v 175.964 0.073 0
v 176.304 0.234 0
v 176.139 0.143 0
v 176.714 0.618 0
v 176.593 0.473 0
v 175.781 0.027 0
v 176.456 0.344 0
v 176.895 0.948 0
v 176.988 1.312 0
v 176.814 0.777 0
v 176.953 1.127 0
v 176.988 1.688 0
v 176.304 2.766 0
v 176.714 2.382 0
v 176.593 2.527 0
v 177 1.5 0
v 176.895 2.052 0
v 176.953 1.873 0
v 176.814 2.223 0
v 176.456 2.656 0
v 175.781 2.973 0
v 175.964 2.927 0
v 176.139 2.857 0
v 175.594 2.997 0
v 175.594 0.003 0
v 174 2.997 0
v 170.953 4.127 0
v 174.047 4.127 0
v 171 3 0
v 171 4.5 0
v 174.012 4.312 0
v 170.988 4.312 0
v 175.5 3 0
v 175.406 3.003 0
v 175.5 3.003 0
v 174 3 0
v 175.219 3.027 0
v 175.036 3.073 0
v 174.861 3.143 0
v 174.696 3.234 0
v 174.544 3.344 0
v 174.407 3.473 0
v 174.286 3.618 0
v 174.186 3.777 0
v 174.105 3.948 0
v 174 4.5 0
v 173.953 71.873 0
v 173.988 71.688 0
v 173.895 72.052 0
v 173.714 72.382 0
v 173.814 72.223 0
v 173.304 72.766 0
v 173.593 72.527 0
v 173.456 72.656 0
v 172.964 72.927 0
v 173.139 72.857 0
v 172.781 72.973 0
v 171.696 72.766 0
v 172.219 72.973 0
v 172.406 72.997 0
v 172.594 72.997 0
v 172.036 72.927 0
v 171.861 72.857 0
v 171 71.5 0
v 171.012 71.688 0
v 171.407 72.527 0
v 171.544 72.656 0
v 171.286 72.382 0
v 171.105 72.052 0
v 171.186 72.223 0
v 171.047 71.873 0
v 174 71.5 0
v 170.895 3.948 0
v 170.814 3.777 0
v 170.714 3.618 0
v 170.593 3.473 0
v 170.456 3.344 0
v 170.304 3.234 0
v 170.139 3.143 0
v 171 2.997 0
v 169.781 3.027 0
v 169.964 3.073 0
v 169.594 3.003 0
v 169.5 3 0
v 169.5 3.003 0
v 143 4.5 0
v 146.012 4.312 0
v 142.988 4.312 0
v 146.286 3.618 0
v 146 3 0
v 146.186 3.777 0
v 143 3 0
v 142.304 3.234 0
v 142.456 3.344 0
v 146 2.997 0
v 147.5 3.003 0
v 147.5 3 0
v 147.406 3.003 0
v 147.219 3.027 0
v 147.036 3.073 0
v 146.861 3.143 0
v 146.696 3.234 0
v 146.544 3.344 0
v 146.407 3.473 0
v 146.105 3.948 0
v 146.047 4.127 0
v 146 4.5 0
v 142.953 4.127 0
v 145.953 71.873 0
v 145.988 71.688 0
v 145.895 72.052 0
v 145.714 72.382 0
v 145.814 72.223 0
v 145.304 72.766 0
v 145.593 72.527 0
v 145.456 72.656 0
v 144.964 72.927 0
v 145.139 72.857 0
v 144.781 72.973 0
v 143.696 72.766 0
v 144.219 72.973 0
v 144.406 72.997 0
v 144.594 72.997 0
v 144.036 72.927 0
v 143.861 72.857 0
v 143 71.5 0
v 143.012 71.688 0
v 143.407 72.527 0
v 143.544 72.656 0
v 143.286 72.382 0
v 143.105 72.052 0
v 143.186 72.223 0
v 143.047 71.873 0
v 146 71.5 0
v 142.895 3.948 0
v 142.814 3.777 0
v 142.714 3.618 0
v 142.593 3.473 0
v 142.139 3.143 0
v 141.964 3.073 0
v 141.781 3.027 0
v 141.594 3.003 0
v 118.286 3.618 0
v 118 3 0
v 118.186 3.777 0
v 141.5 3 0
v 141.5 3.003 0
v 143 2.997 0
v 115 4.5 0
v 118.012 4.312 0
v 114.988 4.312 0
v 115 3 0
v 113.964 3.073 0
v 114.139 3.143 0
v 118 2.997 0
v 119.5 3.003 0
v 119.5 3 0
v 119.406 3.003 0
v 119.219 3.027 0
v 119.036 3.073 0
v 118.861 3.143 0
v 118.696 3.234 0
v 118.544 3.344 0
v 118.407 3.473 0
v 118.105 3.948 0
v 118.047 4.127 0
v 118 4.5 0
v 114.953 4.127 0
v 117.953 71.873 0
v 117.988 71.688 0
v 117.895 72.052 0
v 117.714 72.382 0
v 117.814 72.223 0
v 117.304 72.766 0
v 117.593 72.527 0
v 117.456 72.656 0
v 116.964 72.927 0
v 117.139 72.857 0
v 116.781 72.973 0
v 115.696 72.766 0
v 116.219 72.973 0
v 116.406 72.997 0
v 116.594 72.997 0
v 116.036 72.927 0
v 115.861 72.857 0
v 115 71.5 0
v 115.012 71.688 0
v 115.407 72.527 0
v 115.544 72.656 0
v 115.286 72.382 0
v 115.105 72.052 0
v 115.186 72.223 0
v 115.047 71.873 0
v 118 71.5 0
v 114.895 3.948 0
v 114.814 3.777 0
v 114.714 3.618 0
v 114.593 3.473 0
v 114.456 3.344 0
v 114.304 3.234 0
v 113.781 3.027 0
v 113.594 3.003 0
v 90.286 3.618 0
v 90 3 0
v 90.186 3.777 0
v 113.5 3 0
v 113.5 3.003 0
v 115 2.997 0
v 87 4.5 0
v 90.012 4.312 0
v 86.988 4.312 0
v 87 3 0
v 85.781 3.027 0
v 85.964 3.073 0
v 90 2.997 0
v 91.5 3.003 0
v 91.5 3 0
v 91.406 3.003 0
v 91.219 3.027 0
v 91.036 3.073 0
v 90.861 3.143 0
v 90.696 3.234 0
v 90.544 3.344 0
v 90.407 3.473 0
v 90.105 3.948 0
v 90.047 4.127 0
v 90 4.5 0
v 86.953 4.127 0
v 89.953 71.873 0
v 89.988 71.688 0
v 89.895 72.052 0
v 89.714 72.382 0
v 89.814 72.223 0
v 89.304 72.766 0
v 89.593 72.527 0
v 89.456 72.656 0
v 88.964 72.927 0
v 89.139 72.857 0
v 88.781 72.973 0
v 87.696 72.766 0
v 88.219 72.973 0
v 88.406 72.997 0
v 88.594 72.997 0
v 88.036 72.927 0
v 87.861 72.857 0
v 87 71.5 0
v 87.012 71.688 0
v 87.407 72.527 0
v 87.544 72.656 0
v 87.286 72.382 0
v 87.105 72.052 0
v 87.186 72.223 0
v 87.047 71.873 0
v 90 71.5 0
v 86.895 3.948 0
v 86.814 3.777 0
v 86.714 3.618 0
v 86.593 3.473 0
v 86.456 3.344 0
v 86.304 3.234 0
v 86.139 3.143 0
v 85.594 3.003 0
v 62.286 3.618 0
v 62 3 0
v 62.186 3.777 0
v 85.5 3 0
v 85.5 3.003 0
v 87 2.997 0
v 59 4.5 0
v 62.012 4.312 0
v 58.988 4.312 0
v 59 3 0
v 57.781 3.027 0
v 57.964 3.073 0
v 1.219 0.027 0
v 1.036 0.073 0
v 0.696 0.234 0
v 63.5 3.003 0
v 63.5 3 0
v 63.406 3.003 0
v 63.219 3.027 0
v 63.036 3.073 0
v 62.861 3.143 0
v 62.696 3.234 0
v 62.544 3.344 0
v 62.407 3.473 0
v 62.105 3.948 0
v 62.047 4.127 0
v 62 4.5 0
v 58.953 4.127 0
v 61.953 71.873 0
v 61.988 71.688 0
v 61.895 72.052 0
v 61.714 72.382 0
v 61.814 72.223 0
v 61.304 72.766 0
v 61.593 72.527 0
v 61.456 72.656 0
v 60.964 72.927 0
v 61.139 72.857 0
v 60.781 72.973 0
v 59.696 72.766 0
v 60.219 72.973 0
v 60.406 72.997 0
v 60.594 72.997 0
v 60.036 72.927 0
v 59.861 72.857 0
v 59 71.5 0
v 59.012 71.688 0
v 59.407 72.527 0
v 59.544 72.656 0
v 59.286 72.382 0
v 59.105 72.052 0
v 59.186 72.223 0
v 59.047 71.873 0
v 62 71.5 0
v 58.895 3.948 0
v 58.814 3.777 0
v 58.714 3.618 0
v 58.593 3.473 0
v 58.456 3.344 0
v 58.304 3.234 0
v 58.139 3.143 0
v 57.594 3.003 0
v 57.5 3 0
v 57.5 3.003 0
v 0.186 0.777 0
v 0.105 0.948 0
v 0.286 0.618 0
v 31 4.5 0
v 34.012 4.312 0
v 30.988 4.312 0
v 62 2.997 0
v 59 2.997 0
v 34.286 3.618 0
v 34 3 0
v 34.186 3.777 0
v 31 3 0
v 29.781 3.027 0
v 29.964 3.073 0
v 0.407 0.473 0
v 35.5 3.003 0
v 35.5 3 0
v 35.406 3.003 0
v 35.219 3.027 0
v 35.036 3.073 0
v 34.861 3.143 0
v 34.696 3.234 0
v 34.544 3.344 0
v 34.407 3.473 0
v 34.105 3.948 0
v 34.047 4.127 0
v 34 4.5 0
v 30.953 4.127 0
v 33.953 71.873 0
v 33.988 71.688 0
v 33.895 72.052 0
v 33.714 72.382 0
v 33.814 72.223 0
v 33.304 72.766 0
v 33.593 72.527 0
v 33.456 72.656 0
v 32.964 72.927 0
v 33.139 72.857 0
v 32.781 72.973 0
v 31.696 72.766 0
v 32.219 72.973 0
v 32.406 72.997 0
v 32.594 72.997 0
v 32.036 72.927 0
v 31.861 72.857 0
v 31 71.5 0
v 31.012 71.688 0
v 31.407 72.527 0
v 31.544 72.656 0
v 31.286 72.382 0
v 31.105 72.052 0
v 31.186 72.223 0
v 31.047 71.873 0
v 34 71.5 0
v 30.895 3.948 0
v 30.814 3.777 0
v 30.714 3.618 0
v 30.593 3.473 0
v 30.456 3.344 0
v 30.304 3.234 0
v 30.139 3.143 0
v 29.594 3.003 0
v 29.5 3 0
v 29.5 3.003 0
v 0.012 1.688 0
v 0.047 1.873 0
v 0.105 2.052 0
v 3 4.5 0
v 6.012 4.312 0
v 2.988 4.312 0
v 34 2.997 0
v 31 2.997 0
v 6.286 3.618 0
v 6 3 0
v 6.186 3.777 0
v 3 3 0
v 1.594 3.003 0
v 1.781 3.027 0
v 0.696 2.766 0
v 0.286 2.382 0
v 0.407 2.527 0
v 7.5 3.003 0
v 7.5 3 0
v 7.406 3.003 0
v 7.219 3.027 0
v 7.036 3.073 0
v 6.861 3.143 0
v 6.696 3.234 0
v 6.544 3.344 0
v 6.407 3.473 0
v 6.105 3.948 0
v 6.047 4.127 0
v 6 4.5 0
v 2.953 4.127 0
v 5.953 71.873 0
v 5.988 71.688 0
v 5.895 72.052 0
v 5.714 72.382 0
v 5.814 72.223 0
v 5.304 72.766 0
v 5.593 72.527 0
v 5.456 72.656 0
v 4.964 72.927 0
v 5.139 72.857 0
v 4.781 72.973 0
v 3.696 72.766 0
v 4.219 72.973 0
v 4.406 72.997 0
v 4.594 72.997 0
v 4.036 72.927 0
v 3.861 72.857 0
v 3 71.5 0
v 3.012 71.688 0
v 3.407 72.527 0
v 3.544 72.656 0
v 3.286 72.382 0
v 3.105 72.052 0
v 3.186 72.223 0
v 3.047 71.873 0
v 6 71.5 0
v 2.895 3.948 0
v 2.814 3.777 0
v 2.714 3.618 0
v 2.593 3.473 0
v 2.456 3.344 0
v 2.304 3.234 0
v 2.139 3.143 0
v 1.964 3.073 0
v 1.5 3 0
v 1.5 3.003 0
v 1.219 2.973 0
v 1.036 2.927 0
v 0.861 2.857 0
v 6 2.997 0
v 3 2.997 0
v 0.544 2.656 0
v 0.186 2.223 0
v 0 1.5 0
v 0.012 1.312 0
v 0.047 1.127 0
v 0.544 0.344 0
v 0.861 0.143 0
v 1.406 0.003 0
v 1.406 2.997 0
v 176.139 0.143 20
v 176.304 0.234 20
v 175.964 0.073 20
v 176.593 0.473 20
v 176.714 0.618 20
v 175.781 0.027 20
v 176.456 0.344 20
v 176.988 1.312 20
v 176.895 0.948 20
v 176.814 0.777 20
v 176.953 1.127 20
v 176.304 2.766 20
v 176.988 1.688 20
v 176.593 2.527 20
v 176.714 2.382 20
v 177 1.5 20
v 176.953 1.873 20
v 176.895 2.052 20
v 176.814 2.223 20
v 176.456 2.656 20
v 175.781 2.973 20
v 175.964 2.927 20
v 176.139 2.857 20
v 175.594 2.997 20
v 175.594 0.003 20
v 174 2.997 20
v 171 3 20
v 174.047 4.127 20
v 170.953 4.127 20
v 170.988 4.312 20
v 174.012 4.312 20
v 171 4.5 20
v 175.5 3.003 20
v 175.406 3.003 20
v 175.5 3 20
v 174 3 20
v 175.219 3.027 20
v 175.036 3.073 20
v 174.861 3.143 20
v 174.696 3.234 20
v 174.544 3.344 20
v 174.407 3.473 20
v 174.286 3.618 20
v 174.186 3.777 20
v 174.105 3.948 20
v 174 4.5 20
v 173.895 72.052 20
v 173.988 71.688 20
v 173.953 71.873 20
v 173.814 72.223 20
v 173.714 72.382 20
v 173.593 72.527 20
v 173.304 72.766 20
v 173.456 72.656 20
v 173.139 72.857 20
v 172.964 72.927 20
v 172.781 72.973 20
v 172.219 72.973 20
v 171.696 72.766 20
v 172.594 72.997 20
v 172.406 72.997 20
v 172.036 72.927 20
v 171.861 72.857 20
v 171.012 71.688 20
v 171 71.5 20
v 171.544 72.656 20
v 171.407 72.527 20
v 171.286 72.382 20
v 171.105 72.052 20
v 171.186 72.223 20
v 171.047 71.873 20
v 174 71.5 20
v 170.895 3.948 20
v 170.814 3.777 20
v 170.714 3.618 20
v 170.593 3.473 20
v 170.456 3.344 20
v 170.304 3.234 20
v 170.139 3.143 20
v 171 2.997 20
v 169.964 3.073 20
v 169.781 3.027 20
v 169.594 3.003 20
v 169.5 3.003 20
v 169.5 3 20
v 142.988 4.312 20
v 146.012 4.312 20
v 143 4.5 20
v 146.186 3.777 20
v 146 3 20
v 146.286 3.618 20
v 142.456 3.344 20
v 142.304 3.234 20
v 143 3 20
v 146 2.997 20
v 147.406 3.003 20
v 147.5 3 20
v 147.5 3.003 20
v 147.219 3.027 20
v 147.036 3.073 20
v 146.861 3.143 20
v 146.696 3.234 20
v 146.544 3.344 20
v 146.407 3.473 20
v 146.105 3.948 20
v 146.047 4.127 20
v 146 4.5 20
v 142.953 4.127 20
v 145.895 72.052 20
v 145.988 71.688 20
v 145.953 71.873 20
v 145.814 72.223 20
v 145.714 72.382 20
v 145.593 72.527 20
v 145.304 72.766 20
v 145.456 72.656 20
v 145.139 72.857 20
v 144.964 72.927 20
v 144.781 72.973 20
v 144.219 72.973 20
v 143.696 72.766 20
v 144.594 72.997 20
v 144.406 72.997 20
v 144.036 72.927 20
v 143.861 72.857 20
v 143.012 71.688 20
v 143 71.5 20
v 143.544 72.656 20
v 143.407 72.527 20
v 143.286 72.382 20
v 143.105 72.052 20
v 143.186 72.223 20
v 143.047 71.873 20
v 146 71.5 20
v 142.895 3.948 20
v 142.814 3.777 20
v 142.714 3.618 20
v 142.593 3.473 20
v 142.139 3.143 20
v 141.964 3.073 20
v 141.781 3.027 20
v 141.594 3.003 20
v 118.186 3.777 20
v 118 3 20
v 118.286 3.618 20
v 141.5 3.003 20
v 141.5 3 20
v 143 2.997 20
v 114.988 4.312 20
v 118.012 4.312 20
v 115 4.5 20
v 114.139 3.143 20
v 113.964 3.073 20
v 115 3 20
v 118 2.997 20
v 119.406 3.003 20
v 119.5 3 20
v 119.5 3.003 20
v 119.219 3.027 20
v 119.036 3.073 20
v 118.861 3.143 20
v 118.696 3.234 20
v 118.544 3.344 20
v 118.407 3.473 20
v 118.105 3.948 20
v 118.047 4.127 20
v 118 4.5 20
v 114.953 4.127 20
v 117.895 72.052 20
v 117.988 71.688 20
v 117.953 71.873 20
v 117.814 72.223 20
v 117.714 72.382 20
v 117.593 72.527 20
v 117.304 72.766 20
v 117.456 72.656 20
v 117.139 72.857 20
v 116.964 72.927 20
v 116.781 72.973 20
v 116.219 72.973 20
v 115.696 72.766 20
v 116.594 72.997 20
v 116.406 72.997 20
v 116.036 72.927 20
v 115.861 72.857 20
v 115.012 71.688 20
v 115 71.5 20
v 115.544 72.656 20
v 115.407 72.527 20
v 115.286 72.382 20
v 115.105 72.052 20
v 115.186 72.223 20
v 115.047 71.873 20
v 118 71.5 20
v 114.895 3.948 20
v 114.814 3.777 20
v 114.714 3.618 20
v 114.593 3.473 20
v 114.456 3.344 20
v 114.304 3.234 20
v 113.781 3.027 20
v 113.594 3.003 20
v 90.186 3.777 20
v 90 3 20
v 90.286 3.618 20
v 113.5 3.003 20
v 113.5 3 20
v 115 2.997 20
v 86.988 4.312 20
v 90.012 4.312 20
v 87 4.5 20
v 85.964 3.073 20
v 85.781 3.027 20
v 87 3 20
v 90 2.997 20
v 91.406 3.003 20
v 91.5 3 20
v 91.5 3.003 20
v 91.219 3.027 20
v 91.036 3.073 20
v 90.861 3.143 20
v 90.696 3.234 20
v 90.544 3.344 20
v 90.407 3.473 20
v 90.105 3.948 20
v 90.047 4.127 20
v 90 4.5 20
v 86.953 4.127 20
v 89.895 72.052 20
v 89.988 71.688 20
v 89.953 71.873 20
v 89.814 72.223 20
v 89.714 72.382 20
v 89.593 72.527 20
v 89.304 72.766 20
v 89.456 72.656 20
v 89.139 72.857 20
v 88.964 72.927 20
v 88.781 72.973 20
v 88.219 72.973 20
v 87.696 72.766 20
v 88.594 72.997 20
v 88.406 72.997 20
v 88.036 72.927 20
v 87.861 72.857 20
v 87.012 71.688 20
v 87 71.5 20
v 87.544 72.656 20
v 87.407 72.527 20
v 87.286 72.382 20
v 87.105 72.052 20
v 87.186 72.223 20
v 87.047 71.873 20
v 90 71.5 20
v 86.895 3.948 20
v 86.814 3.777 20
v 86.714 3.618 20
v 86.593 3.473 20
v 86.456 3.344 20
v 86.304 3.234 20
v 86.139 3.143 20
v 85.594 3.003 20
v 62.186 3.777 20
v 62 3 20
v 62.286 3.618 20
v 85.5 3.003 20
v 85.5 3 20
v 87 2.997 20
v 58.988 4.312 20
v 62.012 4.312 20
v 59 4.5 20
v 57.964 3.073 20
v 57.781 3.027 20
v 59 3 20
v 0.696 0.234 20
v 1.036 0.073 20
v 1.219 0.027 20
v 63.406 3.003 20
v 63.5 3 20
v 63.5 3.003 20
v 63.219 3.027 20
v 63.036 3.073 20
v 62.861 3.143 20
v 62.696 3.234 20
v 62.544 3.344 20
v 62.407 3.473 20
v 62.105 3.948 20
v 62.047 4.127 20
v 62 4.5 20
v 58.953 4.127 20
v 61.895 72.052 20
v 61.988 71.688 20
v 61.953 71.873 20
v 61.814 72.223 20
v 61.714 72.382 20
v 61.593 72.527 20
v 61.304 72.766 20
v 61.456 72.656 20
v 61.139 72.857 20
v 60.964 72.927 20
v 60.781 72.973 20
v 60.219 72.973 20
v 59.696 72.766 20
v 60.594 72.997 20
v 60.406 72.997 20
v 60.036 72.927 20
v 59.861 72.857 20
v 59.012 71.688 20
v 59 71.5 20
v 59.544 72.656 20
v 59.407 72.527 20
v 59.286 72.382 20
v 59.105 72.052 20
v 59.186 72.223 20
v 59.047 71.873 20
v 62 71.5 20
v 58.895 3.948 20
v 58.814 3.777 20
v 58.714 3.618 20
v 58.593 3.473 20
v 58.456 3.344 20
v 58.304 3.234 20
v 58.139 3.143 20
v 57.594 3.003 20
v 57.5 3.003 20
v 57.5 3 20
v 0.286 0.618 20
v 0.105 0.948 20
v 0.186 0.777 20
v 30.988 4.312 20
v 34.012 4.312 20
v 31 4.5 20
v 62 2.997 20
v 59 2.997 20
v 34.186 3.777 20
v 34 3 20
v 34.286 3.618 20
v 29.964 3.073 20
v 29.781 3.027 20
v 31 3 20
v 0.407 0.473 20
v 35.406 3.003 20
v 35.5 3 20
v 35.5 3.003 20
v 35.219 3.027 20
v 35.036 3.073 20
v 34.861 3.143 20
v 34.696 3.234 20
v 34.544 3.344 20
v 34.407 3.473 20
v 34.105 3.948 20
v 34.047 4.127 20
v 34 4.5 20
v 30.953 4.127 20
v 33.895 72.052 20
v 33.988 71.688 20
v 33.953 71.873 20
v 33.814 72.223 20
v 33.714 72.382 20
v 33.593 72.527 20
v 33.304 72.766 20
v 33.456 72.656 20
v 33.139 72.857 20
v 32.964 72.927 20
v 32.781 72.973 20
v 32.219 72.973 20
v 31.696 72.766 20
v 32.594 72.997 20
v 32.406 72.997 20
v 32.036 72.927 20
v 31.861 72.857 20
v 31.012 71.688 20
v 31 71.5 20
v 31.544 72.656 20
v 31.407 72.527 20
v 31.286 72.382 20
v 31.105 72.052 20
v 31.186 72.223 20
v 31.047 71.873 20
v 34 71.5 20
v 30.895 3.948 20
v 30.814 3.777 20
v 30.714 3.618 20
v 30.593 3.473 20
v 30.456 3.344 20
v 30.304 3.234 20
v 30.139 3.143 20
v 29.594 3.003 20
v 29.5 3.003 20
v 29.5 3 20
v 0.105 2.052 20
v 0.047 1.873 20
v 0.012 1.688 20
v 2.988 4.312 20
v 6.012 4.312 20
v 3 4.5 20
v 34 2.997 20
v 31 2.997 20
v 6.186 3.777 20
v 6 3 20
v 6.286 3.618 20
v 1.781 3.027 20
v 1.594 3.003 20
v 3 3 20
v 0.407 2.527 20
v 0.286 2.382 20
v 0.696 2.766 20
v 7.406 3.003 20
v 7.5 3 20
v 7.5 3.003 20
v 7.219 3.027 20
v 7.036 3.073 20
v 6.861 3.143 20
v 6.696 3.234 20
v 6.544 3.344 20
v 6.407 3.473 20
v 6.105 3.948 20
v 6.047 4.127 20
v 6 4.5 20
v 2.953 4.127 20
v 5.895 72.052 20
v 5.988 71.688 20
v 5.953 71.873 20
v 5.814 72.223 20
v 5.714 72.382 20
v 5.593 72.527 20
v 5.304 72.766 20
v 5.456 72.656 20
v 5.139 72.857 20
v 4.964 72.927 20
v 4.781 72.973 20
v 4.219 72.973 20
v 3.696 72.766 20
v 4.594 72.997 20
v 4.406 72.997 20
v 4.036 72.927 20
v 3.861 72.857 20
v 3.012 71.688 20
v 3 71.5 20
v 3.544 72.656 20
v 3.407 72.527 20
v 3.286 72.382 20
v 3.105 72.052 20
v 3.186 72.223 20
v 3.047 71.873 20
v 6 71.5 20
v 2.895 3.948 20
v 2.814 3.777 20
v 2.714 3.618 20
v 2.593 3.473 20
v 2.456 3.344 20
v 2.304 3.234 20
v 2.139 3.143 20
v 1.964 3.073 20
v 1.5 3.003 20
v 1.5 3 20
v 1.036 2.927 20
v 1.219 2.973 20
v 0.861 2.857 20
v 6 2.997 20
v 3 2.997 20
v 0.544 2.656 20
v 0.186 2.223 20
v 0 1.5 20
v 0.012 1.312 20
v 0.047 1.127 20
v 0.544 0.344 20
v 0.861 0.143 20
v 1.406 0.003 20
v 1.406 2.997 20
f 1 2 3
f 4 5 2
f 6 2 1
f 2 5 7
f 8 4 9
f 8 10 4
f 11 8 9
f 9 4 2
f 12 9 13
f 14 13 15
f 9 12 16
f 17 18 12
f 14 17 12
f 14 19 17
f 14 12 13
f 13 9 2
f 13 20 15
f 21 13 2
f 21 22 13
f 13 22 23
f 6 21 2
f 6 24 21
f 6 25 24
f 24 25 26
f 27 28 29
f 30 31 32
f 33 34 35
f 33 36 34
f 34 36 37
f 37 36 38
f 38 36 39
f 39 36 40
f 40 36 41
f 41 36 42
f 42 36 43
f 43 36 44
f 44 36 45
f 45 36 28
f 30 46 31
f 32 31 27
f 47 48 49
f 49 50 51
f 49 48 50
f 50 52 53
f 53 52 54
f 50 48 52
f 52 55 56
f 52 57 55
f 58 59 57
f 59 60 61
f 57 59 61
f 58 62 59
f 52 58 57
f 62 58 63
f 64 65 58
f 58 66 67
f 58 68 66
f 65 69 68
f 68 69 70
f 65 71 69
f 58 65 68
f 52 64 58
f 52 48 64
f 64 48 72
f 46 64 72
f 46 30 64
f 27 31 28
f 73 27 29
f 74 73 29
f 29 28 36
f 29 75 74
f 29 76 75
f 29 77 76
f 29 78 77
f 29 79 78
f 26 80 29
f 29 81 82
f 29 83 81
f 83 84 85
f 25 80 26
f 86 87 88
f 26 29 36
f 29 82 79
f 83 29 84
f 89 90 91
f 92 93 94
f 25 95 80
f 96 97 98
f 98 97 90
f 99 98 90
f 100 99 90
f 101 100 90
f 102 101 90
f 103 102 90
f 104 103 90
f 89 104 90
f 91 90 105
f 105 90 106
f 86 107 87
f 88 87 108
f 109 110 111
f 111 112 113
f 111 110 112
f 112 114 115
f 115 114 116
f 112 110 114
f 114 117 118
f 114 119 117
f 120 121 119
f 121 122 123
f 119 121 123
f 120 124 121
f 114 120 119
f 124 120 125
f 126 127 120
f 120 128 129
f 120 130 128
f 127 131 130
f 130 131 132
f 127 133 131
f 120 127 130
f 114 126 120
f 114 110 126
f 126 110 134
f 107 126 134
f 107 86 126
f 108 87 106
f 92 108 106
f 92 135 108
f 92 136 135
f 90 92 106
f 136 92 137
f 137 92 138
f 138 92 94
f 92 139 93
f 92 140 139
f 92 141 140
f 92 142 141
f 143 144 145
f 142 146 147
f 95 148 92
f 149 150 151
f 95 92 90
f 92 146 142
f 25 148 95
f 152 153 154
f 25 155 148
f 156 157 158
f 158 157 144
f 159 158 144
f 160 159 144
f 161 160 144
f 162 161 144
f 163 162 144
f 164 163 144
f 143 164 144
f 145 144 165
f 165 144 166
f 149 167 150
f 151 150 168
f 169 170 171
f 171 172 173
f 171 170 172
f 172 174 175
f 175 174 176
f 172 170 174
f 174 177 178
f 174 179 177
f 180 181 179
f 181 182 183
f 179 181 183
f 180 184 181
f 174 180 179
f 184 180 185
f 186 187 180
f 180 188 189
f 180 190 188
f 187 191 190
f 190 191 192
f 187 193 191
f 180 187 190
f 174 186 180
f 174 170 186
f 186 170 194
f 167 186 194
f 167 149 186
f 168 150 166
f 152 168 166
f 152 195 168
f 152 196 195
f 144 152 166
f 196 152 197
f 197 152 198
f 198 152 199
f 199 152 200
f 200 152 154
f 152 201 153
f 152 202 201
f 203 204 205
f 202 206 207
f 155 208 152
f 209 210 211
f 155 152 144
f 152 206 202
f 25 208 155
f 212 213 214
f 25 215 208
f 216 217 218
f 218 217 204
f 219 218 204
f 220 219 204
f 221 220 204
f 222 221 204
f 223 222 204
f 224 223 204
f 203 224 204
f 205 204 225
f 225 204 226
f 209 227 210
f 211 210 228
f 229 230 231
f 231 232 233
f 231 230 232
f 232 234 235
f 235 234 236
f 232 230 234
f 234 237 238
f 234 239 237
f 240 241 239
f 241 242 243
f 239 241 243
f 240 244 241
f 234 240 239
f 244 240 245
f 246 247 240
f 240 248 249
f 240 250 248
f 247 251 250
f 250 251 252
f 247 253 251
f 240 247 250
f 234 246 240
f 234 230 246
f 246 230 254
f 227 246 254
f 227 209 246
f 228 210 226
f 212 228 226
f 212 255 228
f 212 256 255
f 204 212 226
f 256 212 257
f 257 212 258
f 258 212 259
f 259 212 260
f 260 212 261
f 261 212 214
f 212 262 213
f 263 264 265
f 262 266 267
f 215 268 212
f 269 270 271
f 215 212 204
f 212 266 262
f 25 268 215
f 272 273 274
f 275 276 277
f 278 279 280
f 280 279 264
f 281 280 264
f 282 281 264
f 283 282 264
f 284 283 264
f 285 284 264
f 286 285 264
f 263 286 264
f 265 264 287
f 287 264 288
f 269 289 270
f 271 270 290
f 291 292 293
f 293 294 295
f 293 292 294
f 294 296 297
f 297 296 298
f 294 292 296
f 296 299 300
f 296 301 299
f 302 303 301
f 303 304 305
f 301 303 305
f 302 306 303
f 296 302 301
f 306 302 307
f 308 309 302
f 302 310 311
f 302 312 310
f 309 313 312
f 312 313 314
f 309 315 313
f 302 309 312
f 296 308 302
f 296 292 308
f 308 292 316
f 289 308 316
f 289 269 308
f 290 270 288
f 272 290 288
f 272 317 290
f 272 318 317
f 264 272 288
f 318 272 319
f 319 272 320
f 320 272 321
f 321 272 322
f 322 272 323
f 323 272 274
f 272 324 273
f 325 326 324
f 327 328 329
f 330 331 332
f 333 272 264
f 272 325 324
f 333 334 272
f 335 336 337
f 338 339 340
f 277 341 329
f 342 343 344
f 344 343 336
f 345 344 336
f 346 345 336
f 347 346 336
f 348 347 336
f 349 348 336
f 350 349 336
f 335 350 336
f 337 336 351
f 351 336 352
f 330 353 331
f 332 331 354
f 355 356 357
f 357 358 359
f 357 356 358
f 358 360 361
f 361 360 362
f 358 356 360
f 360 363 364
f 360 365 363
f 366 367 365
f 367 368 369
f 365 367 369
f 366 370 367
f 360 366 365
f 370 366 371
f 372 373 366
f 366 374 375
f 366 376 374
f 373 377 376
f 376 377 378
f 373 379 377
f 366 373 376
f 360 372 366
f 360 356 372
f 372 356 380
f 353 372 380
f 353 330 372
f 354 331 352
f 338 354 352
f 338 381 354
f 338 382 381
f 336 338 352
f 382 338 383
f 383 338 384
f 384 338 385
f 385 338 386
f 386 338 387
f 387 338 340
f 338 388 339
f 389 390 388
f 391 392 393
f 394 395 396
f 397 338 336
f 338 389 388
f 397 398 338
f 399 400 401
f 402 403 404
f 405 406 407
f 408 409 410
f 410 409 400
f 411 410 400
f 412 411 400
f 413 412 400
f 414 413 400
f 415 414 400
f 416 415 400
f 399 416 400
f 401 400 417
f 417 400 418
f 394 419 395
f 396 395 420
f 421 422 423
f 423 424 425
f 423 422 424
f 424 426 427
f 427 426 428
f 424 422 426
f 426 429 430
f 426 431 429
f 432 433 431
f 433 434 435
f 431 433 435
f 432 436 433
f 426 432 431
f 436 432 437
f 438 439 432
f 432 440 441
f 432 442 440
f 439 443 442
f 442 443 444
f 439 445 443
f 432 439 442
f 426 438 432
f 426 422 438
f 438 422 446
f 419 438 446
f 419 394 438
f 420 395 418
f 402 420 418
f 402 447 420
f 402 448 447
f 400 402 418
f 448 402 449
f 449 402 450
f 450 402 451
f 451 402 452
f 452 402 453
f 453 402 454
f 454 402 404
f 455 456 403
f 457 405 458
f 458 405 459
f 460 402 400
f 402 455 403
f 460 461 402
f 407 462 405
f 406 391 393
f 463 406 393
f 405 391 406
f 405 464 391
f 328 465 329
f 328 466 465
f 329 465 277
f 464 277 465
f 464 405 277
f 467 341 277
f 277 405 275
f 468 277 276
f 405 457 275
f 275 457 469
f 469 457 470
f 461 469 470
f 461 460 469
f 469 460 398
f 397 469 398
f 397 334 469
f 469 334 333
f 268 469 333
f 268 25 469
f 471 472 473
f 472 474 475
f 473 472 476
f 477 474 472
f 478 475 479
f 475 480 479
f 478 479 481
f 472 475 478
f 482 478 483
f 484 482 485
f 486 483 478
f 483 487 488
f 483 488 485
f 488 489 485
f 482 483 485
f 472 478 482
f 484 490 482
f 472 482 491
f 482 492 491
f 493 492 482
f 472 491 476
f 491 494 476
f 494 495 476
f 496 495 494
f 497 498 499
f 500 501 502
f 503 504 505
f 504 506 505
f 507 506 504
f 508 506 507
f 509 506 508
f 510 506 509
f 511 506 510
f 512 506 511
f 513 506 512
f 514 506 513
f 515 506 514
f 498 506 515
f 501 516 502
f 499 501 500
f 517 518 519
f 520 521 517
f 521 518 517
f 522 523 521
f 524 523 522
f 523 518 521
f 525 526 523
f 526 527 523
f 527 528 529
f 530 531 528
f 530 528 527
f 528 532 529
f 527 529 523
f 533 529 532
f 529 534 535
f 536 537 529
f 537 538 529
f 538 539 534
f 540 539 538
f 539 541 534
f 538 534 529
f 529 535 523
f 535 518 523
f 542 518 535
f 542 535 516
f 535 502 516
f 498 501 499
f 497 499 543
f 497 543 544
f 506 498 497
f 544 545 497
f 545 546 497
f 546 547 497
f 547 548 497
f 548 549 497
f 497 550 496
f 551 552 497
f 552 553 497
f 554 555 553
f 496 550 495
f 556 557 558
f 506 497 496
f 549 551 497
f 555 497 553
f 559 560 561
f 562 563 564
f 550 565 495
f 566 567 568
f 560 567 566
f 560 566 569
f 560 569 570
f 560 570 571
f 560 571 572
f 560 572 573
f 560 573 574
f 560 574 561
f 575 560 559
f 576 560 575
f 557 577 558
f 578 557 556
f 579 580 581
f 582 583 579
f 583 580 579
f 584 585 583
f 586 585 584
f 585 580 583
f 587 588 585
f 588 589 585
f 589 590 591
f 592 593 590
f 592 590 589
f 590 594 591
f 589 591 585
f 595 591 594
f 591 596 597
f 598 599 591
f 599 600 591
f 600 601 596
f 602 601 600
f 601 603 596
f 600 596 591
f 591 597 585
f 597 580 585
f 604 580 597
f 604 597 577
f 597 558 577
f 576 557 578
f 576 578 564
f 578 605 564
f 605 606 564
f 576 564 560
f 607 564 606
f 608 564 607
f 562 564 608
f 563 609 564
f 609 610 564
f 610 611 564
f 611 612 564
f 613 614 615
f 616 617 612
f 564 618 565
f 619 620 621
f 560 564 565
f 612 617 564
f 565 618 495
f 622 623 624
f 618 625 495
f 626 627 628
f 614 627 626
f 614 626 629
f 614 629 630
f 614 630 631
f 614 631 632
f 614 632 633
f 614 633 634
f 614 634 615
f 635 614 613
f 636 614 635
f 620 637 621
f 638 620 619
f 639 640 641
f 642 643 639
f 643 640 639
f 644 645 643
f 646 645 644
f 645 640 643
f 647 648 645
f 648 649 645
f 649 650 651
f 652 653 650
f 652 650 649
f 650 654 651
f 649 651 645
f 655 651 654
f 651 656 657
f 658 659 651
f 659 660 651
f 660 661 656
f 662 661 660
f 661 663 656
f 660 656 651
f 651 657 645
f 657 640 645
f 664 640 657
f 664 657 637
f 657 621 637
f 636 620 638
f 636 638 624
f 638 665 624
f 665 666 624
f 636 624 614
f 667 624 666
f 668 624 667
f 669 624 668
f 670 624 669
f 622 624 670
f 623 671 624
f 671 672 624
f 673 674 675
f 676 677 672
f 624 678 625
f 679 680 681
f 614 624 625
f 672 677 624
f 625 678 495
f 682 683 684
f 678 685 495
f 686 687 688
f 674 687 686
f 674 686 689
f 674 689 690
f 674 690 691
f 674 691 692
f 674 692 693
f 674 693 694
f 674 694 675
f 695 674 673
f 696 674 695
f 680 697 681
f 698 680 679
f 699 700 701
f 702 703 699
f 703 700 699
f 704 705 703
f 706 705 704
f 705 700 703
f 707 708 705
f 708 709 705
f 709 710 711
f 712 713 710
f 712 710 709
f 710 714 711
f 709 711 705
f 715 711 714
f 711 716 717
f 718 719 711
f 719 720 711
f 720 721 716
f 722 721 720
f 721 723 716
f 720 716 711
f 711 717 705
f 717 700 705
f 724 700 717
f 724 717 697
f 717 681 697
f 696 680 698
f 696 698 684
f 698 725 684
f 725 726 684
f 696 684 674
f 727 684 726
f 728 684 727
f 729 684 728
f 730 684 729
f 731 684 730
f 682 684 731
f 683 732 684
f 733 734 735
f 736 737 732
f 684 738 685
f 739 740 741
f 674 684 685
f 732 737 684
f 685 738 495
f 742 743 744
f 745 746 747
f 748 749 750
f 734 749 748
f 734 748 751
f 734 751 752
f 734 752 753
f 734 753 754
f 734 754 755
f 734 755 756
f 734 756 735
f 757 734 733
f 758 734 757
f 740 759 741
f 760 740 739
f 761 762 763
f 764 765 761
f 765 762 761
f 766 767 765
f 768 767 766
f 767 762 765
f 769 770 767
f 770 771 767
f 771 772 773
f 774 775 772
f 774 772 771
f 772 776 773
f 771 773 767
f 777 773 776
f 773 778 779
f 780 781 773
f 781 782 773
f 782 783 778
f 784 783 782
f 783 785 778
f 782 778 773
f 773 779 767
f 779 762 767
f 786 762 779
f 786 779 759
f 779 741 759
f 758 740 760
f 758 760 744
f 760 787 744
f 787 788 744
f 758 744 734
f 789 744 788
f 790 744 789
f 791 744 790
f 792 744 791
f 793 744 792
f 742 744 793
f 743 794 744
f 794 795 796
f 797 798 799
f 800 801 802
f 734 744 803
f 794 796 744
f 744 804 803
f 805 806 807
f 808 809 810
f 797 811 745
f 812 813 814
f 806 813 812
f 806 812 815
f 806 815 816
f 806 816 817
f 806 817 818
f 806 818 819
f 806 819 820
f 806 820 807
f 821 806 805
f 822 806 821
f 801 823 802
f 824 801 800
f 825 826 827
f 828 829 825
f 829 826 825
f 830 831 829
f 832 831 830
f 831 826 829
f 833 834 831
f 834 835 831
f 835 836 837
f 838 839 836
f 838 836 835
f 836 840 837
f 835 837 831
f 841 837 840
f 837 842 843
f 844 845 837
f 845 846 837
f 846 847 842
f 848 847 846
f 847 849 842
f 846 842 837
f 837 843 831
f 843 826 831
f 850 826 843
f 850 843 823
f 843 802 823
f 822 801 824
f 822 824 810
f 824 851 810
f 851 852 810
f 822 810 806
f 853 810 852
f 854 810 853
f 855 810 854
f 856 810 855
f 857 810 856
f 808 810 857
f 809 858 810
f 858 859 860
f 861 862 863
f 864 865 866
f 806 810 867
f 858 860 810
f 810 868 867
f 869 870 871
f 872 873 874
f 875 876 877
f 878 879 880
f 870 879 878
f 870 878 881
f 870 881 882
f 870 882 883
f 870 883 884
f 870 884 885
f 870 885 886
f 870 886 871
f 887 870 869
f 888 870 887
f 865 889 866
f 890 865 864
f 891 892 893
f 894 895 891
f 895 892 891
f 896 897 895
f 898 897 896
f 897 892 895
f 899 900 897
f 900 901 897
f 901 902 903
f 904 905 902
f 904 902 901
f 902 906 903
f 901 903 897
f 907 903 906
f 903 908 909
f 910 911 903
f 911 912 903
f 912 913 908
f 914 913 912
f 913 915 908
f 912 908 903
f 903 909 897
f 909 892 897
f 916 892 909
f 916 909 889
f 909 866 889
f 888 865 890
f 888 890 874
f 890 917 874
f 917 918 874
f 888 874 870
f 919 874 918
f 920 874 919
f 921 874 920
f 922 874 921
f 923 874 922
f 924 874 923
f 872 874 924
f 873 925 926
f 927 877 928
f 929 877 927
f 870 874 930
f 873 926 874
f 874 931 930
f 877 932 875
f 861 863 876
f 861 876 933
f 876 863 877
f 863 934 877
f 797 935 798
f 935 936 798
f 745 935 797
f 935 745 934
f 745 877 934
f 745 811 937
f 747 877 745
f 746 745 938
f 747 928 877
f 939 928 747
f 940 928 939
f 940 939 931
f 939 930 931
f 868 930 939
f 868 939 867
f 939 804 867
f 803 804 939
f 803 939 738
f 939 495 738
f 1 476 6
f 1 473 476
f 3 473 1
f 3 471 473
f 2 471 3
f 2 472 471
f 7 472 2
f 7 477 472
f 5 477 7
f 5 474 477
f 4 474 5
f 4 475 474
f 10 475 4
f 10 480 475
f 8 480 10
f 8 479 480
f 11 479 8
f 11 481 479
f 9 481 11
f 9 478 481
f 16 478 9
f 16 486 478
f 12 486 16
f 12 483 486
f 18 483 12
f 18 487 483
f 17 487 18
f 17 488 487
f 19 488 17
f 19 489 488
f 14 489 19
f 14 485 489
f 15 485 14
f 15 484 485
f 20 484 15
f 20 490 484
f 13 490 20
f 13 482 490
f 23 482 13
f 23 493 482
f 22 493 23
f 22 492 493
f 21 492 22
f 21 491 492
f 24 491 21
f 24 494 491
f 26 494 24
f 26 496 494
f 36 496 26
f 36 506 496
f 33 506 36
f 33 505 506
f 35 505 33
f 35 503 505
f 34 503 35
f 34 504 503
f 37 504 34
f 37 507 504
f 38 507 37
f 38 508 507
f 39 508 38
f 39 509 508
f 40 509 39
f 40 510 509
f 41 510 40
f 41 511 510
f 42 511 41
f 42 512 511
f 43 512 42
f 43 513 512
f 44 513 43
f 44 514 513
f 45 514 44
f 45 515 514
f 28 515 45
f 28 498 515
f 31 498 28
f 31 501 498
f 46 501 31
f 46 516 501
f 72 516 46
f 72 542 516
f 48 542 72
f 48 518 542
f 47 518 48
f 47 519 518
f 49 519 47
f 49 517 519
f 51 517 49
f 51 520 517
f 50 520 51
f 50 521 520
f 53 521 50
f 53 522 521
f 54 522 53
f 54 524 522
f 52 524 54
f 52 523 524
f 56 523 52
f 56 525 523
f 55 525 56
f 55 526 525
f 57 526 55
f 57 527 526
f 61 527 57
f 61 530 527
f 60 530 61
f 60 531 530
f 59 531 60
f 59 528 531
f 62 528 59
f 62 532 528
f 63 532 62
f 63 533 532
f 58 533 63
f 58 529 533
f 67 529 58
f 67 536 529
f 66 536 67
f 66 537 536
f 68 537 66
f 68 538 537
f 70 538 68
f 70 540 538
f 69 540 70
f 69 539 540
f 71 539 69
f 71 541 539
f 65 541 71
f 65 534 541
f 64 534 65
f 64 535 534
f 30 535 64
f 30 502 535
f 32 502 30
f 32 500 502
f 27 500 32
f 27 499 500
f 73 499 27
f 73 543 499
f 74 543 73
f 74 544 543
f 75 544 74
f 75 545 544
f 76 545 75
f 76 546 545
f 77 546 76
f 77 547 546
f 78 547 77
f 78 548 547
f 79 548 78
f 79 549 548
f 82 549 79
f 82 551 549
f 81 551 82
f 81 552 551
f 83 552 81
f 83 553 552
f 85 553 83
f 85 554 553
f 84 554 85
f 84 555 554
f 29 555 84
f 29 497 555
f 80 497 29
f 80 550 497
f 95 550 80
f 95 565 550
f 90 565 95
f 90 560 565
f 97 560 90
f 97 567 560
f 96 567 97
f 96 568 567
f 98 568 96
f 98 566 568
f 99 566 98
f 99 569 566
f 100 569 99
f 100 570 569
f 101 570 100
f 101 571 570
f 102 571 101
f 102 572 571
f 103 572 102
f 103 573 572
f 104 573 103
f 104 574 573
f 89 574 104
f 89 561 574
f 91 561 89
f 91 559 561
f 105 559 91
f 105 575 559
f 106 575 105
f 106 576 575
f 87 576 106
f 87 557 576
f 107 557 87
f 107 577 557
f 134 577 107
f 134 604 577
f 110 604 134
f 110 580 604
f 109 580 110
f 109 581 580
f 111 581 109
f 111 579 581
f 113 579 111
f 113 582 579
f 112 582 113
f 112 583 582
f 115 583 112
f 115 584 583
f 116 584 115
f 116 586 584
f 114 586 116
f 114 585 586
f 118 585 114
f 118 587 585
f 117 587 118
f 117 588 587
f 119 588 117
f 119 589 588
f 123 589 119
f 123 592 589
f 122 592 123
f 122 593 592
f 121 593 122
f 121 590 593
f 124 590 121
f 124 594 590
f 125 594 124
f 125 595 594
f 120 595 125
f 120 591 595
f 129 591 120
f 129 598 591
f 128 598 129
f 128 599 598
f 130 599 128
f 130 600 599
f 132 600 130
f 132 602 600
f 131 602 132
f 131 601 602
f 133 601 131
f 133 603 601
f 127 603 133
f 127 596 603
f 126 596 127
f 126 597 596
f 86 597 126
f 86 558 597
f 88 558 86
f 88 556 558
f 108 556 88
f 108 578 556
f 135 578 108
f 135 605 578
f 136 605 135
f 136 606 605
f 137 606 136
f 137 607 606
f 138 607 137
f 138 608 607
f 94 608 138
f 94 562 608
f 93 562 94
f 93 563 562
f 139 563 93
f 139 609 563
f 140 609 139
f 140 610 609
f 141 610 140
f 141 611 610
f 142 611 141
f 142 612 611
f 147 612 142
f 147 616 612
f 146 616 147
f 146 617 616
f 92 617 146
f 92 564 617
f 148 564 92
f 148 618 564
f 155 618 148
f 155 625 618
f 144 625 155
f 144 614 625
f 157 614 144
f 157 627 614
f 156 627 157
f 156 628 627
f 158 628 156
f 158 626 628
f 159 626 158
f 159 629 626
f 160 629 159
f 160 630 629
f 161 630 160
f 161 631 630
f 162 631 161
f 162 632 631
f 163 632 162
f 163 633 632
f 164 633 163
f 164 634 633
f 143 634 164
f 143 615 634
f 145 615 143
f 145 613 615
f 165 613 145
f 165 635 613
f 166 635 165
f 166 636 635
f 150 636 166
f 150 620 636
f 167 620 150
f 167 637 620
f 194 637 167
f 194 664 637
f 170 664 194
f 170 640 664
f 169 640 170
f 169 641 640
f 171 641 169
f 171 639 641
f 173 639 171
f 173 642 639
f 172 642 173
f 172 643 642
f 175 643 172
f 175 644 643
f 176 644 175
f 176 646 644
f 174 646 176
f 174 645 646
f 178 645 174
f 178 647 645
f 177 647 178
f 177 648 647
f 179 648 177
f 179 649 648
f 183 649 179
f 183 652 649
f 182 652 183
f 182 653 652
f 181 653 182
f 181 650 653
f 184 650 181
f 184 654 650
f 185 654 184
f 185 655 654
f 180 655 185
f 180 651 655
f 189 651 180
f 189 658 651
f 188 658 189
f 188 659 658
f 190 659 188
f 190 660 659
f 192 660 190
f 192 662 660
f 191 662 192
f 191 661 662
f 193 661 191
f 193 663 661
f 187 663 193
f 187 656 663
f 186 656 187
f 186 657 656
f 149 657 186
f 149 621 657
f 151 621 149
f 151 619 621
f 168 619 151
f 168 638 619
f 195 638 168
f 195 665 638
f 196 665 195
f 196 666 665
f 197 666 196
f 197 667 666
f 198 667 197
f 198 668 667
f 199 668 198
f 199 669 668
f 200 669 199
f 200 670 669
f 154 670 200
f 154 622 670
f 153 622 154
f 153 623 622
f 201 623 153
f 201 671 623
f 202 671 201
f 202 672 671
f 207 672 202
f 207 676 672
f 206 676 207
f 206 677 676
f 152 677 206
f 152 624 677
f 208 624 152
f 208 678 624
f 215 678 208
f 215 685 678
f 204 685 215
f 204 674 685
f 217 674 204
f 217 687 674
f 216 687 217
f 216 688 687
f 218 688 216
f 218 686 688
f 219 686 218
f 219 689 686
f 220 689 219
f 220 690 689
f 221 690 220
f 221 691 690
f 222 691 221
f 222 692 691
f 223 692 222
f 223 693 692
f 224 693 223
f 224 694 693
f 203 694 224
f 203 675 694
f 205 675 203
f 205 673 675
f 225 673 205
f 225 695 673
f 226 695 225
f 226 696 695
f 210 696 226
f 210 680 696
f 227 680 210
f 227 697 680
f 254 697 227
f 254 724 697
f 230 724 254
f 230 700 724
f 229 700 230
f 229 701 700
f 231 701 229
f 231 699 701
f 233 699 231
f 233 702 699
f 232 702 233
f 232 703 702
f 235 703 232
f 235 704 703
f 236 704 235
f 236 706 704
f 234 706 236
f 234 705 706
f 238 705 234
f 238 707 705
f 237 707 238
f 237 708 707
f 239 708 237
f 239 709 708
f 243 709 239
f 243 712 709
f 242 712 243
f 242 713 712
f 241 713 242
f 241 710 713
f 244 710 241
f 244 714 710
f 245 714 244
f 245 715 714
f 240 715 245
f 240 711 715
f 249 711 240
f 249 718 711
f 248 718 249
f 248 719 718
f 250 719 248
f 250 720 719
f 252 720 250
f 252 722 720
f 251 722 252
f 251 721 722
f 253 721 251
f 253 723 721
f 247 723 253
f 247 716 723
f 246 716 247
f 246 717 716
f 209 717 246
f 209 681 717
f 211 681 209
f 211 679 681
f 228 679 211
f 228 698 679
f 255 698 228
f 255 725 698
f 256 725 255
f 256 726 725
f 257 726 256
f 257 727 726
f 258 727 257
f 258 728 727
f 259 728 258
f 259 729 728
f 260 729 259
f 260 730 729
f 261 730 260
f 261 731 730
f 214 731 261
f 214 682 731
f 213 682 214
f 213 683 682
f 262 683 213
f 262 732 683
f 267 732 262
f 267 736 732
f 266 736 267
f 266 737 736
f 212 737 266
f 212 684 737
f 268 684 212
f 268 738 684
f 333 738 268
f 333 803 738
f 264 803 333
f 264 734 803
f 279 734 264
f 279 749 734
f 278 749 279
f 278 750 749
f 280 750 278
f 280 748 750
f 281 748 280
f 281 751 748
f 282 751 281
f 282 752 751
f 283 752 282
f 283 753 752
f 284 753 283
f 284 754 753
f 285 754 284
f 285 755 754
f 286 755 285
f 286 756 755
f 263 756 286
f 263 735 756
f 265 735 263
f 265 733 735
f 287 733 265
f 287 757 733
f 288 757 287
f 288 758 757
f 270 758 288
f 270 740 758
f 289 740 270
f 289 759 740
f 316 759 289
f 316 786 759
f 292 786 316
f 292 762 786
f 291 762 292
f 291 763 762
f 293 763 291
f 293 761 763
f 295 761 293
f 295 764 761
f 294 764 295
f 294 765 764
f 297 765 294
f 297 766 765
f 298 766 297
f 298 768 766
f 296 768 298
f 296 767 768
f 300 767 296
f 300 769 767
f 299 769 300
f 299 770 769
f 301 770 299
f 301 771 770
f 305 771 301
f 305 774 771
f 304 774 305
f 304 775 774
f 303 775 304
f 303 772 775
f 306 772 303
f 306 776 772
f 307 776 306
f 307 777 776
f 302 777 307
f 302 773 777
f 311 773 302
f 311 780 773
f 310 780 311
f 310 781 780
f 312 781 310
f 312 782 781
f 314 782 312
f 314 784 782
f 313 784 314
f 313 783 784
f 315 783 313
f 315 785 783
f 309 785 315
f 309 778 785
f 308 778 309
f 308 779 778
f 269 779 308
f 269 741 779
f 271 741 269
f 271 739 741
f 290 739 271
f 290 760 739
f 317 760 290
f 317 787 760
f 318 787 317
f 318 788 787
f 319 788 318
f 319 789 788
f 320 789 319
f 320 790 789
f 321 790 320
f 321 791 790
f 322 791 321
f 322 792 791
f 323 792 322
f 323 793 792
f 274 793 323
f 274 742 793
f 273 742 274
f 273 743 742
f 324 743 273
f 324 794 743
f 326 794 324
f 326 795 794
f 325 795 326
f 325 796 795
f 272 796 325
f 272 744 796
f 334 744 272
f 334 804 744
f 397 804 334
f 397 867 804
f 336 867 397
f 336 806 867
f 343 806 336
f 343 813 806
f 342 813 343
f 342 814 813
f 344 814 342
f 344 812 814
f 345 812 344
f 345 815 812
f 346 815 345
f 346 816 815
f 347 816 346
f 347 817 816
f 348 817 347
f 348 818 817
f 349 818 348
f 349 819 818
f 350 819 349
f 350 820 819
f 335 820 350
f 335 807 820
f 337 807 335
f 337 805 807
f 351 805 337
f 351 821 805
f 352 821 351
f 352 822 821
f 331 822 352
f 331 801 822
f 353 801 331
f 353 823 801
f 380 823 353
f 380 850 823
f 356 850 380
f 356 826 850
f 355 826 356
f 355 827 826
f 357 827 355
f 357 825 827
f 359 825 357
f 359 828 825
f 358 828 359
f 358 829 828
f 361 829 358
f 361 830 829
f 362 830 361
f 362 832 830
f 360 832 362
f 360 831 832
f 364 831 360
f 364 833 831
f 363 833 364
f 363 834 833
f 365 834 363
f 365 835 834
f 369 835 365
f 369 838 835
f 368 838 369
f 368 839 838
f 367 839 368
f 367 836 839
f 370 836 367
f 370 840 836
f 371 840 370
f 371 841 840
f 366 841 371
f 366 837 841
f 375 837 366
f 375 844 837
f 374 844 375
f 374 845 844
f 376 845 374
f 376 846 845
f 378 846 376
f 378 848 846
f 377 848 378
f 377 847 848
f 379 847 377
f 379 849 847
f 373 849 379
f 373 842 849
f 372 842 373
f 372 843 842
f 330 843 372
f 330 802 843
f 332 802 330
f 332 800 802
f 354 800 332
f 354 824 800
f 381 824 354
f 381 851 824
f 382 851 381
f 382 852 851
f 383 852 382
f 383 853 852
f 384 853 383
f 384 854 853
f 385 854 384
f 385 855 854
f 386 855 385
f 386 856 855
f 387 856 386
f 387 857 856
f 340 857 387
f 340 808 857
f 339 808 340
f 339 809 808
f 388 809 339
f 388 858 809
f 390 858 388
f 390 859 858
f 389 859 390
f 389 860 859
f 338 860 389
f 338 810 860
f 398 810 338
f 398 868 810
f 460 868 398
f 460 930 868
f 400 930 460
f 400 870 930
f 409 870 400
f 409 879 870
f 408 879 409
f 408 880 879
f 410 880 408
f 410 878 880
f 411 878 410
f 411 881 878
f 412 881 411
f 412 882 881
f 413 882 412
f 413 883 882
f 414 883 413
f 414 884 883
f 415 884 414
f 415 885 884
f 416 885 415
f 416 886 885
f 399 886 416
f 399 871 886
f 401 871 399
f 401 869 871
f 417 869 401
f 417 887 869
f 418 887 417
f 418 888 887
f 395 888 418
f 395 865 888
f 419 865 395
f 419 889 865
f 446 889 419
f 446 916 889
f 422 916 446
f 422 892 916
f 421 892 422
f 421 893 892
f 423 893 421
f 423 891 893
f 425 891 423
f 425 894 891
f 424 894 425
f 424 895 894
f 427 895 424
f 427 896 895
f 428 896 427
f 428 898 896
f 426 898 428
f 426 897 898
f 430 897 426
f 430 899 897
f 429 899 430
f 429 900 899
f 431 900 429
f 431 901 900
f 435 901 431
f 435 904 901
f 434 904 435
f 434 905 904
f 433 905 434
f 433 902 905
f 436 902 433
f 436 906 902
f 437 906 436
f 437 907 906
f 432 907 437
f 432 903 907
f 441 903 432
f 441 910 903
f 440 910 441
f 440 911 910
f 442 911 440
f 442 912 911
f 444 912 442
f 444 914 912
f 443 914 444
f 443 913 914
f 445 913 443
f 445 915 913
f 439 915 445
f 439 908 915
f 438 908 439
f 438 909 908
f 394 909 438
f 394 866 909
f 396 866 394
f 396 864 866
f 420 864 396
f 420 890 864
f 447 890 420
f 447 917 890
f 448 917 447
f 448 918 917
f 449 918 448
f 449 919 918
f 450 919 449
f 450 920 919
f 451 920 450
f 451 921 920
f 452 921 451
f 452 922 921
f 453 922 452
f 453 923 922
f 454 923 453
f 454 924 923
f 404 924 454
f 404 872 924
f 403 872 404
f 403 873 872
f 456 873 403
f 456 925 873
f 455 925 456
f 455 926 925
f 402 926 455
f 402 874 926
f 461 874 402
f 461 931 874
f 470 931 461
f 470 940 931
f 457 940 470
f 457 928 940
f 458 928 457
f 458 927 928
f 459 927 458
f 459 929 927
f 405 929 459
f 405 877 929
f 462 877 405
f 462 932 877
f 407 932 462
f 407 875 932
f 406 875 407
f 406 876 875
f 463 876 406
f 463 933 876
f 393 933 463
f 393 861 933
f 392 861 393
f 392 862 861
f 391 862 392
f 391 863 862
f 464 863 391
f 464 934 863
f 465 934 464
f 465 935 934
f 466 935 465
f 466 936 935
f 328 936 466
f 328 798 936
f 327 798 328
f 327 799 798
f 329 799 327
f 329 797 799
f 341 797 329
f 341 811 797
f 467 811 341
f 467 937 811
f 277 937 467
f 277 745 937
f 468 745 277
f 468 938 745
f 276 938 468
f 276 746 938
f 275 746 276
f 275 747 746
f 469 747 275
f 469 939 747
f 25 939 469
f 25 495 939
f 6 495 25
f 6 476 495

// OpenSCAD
// Control constants
WIDTH_END = 3;
WIDTH_DIVIDER = 3;
WIDTH_GAP = 25;
HEIGHT_BASE = 3;
HEIGHT_DIVIDER = 70;
DEPTH = 20;
COUNT_DIVIDERS = 7;

$fn = 50;

// Calculated constants
COUNT_GAPS = COUNT_DIVIDERS - 1;
WIDTH_DIVIDER_HALF = WIDTH_DIVIDER / 2;
WIDTH_TOTAL = 2 * WIDTH_END + COUNT_DIVIDERS * WIDTH_DIVIDER + COUNT_GAPS * WIDTH_GAP;
HEIGHT_BASE_HALF = HEIGHT_BASE / 2;

module rounded_rectangle(w, h, r) {
  hull() {
    translate([r, r]) { circle(r); }
    translate([r, h-r]) { circle(r); }
    translate([w-r, r]) { circle(r); }
    translate([w-r, h-r]) { circle(r); }
  }
}

linear_extrude(height=DEPTH) {
  // Base
  rounded_rectangle(WIDTH_TOTAL, HEIGHT_BASE, HEIGHT_BASE_HALF);

  // Dividers
  for (x = [0:COUNT_DIVIDERS-1]) {
    translate([WIDTH_END + x * (WIDTH_GAP + WIDTH_DIVIDER), HEIGHT_BASE_HALF]) {
      rounded_rectangle(WIDTH_DIVIDER, HEIGHT_DIVIDER + HEIGHT_BASE_HALF, WIDTH_DIVIDER_HALF);
      translate([-WIDTH_DIVIDER_HALF, HEIGHT_BASE_HALF]) {
        difference() {
          square([WIDTH_DIVIDER * 2, WIDTH_DIVIDER_HALF]);
          translate([0, WIDTH_DIVIDER_HALF]) {
            circle(WIDTH_DIVIDER_HALF);
          }
          translate([WIDTH_DIVIDER * 2, WIDTH_DIVIDER_HALF]) {
            circle(WIDTH_DIVIDER_HALF);
          }
        }
      }
    }
  }
}
